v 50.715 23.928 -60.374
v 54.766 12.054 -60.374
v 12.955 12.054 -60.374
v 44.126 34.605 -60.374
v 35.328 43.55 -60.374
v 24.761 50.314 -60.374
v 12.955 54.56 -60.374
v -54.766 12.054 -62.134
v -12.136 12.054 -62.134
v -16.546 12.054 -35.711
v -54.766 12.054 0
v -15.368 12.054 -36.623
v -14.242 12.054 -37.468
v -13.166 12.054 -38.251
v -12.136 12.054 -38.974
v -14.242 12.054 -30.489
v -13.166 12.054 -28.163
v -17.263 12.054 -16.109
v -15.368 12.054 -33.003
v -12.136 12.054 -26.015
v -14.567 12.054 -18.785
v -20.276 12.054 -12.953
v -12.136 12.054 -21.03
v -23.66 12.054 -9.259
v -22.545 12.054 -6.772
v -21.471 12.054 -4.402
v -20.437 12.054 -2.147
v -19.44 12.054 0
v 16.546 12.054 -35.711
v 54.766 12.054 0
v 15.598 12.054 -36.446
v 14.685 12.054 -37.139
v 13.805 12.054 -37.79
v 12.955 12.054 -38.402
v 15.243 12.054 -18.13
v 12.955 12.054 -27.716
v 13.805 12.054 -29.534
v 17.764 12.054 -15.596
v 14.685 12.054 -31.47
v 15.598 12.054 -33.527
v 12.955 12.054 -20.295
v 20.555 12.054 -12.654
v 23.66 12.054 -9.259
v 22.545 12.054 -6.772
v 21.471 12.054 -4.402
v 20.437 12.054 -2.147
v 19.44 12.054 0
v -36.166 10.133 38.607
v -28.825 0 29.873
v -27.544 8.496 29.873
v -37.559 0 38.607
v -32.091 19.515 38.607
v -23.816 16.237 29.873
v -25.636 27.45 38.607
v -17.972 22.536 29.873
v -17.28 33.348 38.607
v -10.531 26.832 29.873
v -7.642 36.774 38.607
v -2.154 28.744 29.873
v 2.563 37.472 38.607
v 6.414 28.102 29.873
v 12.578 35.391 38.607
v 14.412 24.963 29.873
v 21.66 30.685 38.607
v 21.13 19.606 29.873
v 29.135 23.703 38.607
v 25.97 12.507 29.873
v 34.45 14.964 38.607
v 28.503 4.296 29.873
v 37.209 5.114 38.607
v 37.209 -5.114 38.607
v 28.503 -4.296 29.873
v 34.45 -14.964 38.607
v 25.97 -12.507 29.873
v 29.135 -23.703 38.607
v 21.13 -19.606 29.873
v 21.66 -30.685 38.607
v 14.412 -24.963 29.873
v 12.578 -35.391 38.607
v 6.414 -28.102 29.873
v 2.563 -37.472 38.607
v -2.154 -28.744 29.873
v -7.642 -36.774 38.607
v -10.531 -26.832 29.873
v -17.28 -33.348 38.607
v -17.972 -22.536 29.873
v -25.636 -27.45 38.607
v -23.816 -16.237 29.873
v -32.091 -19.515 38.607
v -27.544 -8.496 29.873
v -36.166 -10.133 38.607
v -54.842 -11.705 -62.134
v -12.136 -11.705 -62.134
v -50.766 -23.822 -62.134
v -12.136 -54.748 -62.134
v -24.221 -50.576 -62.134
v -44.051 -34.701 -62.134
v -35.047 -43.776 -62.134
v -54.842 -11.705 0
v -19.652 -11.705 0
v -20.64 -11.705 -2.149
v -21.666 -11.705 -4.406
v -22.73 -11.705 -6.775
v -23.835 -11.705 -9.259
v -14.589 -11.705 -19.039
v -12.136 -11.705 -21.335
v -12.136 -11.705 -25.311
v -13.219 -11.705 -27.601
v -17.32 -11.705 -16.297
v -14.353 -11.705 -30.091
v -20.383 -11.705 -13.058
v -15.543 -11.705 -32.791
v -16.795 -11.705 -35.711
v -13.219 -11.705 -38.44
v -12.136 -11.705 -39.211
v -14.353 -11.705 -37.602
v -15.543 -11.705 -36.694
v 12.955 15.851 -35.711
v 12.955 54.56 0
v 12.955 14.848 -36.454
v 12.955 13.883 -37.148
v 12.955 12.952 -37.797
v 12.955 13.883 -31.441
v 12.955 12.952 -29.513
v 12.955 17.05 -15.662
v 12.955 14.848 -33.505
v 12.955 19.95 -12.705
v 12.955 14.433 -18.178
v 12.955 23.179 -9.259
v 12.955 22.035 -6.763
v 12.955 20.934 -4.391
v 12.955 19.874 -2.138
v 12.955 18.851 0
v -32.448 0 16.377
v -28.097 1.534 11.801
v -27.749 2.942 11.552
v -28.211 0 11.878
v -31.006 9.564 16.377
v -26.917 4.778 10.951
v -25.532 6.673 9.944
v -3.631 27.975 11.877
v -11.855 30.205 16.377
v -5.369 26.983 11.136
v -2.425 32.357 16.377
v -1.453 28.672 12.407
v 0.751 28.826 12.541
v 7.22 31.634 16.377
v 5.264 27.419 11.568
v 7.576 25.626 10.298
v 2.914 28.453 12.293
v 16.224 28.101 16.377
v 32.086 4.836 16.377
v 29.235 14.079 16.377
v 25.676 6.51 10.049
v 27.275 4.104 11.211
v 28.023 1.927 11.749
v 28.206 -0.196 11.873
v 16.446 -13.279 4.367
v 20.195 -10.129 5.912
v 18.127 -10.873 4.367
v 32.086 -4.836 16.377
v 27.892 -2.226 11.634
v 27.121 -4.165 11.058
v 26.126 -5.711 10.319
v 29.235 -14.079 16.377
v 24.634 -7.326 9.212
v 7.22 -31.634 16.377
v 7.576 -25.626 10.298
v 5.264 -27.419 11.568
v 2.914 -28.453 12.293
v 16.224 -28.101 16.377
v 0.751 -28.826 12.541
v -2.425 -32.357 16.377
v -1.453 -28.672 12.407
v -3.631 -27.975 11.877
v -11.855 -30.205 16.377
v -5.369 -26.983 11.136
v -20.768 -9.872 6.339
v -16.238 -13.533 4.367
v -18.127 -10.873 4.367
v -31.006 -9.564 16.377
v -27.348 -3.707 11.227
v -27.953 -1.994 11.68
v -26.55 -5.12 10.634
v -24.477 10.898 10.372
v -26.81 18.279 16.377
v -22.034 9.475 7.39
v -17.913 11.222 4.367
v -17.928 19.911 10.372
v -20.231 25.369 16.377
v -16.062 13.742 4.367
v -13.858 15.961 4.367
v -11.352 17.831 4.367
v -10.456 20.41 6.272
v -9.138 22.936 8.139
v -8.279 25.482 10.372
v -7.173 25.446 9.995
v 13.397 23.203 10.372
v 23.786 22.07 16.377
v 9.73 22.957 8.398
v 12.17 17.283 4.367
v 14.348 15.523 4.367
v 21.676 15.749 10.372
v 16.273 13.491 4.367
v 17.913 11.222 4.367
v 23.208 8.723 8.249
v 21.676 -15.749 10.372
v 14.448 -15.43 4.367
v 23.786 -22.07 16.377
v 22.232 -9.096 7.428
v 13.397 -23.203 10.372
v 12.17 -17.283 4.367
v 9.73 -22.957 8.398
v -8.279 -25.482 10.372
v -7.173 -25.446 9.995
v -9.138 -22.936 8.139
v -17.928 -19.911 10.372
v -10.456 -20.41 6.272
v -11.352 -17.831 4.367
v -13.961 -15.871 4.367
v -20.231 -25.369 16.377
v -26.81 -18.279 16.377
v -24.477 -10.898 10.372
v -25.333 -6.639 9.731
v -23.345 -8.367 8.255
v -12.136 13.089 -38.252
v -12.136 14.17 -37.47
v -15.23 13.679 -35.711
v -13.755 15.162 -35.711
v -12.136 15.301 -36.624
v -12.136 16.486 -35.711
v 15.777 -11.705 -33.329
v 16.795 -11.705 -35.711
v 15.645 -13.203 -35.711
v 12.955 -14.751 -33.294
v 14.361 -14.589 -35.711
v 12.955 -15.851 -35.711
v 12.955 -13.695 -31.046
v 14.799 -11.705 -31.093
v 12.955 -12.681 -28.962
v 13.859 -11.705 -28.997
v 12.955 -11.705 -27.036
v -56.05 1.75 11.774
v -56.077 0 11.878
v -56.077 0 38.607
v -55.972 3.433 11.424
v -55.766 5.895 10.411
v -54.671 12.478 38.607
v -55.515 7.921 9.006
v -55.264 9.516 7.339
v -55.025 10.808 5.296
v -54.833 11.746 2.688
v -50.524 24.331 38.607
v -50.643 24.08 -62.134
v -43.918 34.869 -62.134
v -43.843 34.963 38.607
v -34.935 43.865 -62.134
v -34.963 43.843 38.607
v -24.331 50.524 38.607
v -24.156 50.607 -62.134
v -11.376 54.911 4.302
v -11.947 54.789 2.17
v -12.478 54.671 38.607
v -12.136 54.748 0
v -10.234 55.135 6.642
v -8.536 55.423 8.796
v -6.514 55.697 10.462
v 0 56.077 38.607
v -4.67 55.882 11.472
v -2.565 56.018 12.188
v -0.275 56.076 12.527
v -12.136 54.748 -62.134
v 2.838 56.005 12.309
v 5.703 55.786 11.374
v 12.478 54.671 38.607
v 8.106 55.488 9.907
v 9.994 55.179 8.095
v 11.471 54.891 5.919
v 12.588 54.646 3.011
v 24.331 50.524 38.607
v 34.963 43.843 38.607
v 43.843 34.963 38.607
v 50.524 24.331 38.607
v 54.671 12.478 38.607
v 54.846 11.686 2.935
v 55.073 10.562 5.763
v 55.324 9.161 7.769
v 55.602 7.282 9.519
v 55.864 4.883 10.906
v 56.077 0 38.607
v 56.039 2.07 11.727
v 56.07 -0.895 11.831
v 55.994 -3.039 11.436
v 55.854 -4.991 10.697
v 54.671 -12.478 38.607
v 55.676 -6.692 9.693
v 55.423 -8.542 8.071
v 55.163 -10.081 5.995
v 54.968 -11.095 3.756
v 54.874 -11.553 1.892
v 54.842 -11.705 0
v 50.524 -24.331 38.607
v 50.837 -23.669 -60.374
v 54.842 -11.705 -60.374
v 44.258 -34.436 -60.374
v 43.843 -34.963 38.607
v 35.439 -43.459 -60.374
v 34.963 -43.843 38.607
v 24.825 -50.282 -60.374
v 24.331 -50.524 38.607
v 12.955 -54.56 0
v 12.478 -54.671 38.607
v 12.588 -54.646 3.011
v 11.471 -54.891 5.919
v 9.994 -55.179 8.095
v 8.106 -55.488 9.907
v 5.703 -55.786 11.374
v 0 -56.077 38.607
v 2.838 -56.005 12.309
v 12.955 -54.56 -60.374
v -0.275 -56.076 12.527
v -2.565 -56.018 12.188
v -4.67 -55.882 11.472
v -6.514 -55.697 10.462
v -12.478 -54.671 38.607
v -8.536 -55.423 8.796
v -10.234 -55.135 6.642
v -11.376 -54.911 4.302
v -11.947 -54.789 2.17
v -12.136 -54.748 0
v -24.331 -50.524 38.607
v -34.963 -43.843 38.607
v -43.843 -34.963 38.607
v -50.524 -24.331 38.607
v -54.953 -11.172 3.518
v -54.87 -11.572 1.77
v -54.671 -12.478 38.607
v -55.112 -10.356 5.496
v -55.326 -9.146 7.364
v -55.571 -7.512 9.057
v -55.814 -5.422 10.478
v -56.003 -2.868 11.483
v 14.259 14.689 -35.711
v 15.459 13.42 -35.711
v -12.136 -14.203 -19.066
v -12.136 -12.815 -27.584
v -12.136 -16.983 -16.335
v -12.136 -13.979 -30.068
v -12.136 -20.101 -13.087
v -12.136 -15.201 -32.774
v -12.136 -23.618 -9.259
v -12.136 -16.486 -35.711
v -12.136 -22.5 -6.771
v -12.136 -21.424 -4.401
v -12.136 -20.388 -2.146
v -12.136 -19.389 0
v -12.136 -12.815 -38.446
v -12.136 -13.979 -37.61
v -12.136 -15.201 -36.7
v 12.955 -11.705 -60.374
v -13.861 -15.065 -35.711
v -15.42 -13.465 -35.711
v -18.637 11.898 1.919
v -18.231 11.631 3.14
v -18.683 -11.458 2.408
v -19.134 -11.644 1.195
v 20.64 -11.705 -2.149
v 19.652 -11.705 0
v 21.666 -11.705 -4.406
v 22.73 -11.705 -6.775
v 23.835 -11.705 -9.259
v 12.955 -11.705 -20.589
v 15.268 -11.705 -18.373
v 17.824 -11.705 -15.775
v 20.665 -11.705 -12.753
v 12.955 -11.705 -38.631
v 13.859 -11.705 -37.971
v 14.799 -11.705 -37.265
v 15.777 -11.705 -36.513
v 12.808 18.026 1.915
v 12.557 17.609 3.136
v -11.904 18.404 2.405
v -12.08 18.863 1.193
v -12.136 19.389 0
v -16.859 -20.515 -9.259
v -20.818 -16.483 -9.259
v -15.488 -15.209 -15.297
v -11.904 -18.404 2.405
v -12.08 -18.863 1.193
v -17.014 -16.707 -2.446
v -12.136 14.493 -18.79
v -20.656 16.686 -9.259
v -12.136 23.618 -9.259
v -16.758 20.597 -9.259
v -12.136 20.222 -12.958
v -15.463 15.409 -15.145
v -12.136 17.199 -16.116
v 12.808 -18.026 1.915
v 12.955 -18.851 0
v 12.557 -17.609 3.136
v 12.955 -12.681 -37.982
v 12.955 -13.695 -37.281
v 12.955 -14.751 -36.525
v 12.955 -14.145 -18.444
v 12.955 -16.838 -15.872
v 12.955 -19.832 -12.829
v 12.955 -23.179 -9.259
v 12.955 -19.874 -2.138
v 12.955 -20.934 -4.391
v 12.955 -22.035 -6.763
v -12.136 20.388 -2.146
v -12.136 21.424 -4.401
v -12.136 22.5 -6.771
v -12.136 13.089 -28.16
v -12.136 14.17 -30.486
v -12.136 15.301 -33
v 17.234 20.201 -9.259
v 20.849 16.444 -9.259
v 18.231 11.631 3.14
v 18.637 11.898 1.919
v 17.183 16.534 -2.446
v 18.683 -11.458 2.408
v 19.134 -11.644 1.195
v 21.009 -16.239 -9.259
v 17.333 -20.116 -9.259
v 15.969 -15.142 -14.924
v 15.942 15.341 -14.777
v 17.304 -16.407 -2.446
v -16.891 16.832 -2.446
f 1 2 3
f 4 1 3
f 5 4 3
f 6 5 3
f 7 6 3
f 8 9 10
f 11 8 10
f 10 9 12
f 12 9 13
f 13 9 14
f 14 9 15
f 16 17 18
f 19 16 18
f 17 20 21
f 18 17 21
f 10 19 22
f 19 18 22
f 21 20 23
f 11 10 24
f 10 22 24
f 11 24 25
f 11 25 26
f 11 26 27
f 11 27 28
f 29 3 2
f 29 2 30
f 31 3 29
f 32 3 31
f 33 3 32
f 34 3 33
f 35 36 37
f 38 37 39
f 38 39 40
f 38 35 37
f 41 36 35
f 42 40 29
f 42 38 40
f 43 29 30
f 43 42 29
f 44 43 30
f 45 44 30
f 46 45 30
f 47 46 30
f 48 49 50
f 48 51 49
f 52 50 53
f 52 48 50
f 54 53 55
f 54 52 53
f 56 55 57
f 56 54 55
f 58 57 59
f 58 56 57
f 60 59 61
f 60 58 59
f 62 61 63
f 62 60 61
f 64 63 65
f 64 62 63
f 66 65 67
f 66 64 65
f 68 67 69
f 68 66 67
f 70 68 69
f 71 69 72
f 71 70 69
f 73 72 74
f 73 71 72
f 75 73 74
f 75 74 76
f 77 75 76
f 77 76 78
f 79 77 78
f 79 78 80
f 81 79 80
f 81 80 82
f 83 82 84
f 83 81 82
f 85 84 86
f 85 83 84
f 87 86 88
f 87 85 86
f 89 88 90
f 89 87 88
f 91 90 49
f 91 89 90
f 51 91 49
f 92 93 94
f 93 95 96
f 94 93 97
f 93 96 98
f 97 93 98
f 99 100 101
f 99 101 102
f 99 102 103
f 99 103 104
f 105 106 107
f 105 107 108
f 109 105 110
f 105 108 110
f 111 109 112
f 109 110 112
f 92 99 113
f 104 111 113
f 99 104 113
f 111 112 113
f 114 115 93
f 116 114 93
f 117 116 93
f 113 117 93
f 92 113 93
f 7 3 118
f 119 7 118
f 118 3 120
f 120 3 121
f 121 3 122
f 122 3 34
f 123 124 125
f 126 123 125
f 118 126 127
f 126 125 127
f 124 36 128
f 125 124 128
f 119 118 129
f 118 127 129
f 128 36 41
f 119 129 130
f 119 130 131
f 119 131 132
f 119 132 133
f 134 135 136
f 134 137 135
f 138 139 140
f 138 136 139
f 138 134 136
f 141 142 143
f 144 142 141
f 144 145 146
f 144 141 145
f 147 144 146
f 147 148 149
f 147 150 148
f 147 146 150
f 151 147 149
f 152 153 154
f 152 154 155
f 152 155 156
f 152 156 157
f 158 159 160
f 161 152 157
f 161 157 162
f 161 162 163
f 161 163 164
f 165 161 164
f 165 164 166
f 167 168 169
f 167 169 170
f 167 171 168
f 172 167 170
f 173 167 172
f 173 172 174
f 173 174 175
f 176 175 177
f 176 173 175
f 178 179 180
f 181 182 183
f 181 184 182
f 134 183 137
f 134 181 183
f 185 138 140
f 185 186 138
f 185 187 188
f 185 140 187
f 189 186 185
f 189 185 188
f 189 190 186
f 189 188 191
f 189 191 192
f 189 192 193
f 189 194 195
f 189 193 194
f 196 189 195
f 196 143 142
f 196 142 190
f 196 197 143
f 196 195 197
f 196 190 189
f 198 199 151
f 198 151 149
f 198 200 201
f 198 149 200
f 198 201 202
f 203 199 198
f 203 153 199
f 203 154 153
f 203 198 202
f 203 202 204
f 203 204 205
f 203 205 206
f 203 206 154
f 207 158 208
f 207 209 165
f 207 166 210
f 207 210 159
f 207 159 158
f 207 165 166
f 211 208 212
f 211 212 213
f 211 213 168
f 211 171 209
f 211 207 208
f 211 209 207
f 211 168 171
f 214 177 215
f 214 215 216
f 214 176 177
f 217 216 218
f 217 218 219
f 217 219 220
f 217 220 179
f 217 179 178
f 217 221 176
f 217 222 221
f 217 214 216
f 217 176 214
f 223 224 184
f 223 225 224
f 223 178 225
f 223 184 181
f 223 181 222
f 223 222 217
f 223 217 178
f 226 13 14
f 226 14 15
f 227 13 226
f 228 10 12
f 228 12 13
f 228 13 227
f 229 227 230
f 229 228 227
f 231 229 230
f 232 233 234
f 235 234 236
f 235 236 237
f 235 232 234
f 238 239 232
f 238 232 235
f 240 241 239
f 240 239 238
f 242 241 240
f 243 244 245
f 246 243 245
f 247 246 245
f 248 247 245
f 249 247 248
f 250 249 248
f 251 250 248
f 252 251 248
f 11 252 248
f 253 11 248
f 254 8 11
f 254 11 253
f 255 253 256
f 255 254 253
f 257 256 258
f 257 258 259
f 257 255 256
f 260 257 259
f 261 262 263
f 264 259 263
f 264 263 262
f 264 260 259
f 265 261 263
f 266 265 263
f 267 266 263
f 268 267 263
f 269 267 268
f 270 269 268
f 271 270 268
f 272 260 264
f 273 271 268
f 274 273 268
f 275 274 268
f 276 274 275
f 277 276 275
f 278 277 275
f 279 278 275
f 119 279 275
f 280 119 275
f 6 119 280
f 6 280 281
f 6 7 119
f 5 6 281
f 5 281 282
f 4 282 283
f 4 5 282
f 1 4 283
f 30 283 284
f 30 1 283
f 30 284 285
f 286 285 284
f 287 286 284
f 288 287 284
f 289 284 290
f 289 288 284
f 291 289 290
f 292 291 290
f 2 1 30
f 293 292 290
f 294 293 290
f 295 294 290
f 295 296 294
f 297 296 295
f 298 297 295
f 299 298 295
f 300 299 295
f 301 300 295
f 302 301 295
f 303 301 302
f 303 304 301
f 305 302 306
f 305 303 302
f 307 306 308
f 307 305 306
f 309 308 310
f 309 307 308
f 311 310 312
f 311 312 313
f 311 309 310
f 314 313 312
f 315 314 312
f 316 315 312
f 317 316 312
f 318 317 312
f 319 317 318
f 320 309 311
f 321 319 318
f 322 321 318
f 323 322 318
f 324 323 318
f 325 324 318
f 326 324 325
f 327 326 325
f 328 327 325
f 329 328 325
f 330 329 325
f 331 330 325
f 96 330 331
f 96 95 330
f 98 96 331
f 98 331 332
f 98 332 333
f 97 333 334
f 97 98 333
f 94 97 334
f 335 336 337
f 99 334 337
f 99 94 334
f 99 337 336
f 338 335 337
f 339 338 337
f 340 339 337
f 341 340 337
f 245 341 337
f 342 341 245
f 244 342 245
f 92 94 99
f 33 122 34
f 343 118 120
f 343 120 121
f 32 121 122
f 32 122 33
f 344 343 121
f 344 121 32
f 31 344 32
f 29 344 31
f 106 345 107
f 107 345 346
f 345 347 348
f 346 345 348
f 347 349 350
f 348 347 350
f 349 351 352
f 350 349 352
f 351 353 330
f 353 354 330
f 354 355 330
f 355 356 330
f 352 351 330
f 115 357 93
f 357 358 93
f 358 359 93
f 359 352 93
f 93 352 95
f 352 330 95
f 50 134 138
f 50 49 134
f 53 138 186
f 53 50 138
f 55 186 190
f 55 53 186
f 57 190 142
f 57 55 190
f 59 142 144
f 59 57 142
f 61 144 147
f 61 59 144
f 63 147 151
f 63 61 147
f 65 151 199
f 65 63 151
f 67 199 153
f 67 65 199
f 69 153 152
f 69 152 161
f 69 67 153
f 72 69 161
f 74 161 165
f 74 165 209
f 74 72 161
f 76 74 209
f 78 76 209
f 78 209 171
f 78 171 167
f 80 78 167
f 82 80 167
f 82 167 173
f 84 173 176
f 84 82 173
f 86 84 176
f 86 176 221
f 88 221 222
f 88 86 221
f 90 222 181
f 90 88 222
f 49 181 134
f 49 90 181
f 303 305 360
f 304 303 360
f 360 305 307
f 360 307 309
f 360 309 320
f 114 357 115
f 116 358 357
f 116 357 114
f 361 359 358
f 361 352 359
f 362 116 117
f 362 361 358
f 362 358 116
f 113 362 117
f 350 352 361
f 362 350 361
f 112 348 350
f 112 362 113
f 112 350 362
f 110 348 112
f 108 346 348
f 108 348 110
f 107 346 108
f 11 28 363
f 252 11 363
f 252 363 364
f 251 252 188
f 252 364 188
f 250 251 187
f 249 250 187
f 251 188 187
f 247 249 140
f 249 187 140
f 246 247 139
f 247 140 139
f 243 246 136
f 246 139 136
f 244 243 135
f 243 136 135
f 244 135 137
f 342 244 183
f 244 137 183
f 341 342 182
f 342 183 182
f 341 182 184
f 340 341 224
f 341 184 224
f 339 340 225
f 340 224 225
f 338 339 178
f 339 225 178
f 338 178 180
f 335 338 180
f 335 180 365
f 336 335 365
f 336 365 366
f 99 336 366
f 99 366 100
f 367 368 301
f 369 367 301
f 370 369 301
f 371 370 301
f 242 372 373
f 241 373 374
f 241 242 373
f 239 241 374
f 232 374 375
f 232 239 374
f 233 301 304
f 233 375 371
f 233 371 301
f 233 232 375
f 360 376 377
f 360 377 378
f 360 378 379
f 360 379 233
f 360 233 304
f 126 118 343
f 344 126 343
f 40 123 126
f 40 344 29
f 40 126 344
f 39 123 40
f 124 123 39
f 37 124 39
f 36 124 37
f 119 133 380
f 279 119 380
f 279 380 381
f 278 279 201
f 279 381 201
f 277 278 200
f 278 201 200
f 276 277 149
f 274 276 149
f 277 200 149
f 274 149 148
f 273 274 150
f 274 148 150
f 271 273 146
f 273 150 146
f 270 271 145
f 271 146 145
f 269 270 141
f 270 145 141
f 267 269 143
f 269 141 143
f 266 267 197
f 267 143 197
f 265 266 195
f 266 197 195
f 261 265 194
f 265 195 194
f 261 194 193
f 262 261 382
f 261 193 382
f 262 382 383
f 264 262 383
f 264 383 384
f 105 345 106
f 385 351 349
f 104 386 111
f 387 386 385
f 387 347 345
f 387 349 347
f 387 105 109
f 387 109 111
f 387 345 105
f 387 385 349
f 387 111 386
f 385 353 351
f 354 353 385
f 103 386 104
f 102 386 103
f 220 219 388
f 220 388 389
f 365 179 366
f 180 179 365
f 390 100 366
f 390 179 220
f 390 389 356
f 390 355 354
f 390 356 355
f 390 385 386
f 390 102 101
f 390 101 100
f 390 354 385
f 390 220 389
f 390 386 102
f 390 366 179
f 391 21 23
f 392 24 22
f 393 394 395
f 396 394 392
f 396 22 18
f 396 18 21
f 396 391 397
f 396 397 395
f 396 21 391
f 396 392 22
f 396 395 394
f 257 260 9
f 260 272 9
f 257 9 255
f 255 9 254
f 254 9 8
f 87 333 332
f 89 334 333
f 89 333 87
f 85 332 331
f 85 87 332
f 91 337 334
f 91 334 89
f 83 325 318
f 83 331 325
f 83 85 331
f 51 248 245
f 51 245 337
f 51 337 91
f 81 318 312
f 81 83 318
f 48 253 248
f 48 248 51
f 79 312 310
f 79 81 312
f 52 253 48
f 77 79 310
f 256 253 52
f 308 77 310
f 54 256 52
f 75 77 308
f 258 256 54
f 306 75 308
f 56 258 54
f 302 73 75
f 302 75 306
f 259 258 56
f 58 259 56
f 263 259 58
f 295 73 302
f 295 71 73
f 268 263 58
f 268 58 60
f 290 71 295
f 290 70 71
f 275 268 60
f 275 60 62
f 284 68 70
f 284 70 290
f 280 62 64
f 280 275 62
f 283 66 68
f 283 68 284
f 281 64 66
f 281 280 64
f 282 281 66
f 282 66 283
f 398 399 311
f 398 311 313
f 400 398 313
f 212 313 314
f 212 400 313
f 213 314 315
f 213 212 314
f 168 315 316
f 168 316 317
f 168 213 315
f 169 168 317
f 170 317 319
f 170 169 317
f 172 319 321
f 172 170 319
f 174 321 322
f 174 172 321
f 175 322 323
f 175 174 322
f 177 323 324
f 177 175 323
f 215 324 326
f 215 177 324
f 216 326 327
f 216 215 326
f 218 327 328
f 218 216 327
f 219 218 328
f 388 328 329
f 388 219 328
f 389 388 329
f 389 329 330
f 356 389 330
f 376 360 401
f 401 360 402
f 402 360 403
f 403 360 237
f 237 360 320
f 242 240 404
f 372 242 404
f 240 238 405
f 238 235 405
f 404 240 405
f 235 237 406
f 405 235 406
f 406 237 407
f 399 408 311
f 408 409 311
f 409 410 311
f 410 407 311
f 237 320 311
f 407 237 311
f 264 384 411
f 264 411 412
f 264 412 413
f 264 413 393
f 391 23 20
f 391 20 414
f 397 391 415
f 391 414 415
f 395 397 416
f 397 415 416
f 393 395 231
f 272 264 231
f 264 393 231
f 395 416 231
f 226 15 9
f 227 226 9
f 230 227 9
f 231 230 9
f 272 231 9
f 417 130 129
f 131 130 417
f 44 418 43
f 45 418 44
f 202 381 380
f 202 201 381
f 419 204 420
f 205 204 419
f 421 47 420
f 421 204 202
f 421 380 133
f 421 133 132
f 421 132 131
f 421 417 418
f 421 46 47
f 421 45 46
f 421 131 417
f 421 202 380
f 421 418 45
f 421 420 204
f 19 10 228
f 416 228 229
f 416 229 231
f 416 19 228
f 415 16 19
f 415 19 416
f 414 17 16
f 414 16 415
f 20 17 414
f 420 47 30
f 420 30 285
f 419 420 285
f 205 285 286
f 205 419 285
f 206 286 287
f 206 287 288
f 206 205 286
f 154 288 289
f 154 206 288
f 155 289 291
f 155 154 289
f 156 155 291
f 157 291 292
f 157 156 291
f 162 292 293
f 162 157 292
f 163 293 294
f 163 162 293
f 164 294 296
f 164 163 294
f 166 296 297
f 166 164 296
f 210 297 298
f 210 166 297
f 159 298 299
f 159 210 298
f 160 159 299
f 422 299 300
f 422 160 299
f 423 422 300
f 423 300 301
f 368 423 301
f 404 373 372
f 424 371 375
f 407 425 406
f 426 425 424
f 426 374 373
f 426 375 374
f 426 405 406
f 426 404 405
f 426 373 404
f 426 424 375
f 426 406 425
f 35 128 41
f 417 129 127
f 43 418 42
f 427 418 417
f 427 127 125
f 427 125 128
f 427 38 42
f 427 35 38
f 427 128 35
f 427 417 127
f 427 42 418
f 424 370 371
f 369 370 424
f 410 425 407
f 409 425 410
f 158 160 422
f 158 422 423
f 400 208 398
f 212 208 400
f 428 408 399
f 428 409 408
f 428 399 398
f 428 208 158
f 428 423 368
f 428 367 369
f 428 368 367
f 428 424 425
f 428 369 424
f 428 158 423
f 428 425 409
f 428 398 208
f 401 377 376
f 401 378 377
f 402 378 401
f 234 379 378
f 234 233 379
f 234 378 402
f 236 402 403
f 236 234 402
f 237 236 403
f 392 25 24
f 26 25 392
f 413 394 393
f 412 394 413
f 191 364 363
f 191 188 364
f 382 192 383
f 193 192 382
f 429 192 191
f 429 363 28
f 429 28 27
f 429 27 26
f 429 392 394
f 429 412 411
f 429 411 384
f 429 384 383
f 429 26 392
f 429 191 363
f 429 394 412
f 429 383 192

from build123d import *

# Parameters (mm, degrees)
F3_DEPTH      = 56.0778768191
F3_DEPTH_BACK = 56.0778768191
F5_DEPTH      = 56.0778769191
F5_DEPTH_BACK = 56.0778769191


with BuildPart() as f1:
    # F0 (on Front) → F1 (revolve)
    with BuildSketch(Plane.XZ):
        Polygon((0, -57.1250468493), (-15.5477952212, -57.1250468493), (-11.3551309332, -44.5470511913), (-20.4713844212, -35.7113393235), (-15.8971827477, -22.5355681032), (-26.5535367653, -9.2588011175), (-21.1380142719, 4.3673580512), (-32.4480030819, 16.3774517456), (-28.8245640695, 29.8727303743), (-37.5592783093, 38.6074446142), (-56.0768768191, 38.6074446142), (-56.0768768191, -72.1487551928), (0, -72.1487551928), align=None)
    revolve(axis=Axis((0, 0, -64.636901021), (0, 0, -1)))

    # F2 (on Front) → F3 (cut, two sides)
    with BuildSketch(Plane.XZ) as f3_sk:
        Polygon((-81.2481045723, -62.1343776584), (-79.4872939587, -92.5083234906), (101.4357730746, -92.5083234906), (101.4357730746, -60.3735670447), (12.955147773, -60.3735670447), (12.955147773, 0), (-12.1363736689, 0), (-12.1363736689, -62.1343776584), align=None)
        with BuildLine():
            ThreePointArc((12.955147773, 0), (0.4093870521, 12.545760721), (-12.1363736689, 0))
            Line((-12.1363736689, 0), (12.955147773, 0))
        make_face()
    extrude(amount=-F3_DEPTH, mode=Mode.SUBTRACT)
    extrude(f3_sk.sketch, amount=F3_DEPTH_BACK, mode=Mode.SUBTRACT)

    # F4 (on Right) → F5 (cut, two sides)
    with BuildSketch(Plane.YZ) as f5_sk:
        with BuildLine():
            Line((12.0539087802, -70.0524225831), (12.0539087802, 0))
            ThreePointArc((12.0539087802, 0), (0.1746942289, 11.8792145513), (-11.7045203224, 0))
            Line((-11.7045203224, 0), (-11.7045203224, -70.0524225831))
            Line((-11.7045203224, -70.0524225831), (12.0539087802, -70.0524225831))
        make_face()
    extrude(amount=-F5_DEPTH, mode=Mode.SUBTRACT)
    extrude(f5_sk.sketch, amount=F5_DEPTH_BACK, mode=Mode.SUBTRACT)


solid = f1.part
